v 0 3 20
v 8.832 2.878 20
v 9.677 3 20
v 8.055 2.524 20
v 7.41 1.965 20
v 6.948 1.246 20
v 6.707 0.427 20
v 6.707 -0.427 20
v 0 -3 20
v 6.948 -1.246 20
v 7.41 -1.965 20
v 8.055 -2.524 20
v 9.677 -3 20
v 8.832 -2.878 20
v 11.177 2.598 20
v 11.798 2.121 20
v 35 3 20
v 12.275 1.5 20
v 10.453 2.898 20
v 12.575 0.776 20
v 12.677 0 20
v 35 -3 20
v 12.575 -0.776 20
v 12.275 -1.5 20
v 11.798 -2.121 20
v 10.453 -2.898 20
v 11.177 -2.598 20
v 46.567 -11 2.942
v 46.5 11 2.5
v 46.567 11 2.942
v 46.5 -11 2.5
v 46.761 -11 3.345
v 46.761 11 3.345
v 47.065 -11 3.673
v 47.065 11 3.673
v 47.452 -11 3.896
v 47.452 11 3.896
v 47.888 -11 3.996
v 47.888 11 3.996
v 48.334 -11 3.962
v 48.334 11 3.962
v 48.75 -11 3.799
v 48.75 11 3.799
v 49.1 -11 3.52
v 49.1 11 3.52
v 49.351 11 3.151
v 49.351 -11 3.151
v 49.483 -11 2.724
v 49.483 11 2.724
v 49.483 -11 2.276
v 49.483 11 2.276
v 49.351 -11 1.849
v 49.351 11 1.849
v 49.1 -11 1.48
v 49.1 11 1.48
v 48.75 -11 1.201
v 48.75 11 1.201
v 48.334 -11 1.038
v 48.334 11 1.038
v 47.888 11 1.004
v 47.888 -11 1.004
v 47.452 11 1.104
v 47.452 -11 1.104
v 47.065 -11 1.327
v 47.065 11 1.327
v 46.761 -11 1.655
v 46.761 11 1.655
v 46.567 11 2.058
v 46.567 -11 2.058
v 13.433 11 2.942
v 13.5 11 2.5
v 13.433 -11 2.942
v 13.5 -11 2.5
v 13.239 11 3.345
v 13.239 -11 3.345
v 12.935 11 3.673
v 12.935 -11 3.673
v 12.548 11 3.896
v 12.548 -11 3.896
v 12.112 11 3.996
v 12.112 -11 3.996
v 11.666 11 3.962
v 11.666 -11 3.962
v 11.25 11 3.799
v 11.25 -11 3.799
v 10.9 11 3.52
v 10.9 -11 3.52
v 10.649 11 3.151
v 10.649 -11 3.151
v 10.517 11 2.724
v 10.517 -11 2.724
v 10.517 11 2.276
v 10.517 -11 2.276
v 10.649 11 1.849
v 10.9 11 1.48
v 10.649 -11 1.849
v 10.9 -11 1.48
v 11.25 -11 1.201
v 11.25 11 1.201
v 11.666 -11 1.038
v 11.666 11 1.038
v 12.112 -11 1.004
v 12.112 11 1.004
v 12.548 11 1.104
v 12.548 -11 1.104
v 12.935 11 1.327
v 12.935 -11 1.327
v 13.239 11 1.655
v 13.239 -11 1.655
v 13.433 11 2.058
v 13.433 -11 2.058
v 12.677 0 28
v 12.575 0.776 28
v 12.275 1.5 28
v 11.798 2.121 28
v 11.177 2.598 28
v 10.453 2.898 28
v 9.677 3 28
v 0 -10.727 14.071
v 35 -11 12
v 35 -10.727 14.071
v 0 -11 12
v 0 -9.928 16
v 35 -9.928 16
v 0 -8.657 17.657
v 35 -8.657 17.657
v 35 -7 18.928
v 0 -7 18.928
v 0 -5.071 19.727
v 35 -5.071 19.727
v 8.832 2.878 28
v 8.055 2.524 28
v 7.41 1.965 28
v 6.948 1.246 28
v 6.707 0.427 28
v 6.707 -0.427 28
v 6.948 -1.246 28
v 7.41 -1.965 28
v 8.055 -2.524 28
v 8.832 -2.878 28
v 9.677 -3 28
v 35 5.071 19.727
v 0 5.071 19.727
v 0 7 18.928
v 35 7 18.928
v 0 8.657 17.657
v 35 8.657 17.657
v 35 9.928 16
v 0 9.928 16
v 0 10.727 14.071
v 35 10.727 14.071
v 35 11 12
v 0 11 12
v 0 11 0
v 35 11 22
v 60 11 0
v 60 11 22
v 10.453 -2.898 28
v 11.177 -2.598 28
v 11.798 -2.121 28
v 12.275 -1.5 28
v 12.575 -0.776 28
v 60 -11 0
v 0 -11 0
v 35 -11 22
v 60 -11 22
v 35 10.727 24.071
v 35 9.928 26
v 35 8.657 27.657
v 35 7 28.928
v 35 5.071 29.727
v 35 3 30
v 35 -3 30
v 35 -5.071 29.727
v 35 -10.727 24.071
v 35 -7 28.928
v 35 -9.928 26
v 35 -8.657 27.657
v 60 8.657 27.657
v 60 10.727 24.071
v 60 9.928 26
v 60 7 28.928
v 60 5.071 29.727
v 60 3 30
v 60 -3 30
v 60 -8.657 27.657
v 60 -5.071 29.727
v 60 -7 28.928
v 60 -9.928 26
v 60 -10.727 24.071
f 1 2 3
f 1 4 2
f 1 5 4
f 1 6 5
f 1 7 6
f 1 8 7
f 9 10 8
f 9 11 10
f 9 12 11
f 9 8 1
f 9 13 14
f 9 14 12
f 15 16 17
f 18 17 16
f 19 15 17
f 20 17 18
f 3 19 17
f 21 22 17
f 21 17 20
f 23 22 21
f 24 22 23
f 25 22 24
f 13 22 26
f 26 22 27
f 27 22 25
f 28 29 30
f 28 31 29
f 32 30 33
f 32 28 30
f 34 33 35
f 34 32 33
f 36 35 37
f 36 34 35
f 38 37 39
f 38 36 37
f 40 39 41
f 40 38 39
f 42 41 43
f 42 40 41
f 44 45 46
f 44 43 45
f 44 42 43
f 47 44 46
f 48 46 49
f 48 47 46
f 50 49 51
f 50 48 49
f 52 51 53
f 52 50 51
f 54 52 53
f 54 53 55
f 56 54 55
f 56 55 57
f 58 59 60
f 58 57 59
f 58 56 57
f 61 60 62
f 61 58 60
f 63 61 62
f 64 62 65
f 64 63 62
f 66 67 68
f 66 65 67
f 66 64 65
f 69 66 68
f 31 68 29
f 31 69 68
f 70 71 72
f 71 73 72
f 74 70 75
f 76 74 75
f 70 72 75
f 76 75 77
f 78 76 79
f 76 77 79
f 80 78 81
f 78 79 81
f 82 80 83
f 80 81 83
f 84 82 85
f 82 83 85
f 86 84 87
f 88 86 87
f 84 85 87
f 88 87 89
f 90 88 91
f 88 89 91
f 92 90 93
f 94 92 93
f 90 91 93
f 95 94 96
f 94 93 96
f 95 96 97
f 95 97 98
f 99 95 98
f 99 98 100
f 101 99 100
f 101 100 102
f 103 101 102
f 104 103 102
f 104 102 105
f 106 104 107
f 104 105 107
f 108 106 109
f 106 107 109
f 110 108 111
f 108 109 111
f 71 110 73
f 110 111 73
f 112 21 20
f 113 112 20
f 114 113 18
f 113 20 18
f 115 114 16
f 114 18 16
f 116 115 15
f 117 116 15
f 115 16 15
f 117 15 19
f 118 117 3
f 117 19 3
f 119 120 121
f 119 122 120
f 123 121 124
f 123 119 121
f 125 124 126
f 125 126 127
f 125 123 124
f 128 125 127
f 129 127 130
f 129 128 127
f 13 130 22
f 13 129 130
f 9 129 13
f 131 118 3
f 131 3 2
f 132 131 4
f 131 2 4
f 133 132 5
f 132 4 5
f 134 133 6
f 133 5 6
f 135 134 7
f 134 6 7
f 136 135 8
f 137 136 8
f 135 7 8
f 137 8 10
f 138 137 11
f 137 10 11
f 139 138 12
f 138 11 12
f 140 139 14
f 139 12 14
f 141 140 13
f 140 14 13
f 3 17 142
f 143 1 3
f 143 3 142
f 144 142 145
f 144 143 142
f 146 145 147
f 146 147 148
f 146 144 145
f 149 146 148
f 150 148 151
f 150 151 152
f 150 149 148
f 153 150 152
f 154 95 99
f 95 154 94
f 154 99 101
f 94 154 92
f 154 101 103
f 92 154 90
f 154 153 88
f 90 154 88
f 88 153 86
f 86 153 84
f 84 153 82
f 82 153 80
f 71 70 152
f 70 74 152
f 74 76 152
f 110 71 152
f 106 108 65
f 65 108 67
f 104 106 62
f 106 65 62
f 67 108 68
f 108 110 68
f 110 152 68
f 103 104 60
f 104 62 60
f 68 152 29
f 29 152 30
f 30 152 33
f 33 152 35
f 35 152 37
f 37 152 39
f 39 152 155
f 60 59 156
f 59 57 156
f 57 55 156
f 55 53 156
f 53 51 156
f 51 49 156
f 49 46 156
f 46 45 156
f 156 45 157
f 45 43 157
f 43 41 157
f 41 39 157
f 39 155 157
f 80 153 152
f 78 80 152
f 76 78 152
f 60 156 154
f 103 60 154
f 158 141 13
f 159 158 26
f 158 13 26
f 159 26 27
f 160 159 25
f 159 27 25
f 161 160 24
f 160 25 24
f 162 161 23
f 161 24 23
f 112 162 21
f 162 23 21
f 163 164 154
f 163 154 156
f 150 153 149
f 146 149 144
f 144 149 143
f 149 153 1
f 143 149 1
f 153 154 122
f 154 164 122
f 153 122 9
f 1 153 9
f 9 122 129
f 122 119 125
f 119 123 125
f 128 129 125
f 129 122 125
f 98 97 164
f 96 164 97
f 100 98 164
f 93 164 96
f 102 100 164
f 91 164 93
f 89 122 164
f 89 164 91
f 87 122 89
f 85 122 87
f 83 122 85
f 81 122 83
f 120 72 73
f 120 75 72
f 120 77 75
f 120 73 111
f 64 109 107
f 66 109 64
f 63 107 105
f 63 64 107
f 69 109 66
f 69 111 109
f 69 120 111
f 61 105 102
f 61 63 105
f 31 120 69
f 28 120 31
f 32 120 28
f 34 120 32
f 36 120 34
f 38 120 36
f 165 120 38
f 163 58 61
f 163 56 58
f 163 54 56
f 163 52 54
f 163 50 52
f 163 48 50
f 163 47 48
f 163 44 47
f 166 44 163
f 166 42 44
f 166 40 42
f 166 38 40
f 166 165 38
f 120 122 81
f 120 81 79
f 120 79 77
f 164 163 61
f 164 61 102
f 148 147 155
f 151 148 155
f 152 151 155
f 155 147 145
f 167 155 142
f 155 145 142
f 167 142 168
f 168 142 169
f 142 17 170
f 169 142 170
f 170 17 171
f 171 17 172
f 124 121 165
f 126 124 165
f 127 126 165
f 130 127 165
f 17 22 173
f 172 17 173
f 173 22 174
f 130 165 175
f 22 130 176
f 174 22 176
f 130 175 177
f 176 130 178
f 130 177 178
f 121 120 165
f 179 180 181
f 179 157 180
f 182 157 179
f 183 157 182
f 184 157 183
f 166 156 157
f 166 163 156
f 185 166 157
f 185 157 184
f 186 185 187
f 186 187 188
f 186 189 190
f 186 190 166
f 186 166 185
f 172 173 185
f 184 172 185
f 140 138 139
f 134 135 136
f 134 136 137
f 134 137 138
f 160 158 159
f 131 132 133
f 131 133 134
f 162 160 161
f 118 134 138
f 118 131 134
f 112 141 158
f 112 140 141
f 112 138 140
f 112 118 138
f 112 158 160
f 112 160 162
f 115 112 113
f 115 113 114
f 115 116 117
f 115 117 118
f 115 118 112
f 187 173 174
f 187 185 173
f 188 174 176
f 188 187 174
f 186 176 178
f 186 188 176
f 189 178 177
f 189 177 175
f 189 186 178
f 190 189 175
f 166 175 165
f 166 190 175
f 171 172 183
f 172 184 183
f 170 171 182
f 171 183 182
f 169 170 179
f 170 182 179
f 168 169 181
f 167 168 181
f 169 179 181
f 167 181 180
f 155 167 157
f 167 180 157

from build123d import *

# Parameters (mm, degrees)
F0_W     = 35
F0_H     = 20
F0_W_2   = 25
F0_H_2   = 10
F1_DEPTH = 11
F2_R     = 8
F3_R     = 8
F5_DEPTH = 8
F6_R     = 1.5
F7_DEPTH = 12.5


# Not quite as in the source:
# - a pattern or mirror of a feature is missing from the dataset's text; its kind, count and spacing are read off the source's solid


with BuildPart() as f1:
    # F0 (on Front) → F1 (new body, symmetric)
    with BuildSketch(Plane.XZ):
        with Locations((17.5, 10)):
            Rectangle(F0_W, F0_H)
        with Locations((47.5, 10)):
            Rectangle(F0_W_2, F0_H)
        with Locations((47.5, 25)):
            Rectangle(F0_W_2, F0_H_2)
    extrude(amount=F1_DEPTH, both=True)

    # F2
    f2_edges = [f1.edges().sort_by_distance(p)[0] for p in [
        (17.5, -11, 20),
        (17.5, 11, 20),
    ]]
    fillet(f2_edges, radius=F2_R)

    # F3
    f3_edges = [f1.edges().sort_by_distance(p)[0] for p in [
        (47.5, -11, 30),
        (47.5, 11, 30),
    ]]
    fillet(f3_edges, radius=F3_R)

    # F4 (on face) → F5 (join)
    with BuildSketch(Plane.XY.offset(20)):
        with BuildLine():
            ThreePointArc((9.6768597141, -3), (11.7981800577, -2.1213203436), (12.6768597141, 0))
            ThreePointArc((12.6768597141, 0), (11.7981800577, 2.1213203436), (9.6768597141, 3))
            ThreePointArc((9.6768597141, 3), (6.6768597141, 0), (9.6768597141, -3))
        make_face()
    extrude(amount=F5_DEPTH)

    # F6 (on Front) → F7 (cut, symmetric)
    with BuildSketch(Plane.XZ):
        with Locations((12, 2.5)):
            Circle(F6_R)
    f7 = extrude(amount=F7_DEPTH, both=True, mode=Mode.SUBTRACT)

    # F7_copies: F7 across plane
    add(f7.mirror(Plane(origin=(30, 0, 0), x_dir=(0, 0, 1), z_dir=(1, 0, 0))), mode=Mode.SUBTRACT)


solid = f1.part
